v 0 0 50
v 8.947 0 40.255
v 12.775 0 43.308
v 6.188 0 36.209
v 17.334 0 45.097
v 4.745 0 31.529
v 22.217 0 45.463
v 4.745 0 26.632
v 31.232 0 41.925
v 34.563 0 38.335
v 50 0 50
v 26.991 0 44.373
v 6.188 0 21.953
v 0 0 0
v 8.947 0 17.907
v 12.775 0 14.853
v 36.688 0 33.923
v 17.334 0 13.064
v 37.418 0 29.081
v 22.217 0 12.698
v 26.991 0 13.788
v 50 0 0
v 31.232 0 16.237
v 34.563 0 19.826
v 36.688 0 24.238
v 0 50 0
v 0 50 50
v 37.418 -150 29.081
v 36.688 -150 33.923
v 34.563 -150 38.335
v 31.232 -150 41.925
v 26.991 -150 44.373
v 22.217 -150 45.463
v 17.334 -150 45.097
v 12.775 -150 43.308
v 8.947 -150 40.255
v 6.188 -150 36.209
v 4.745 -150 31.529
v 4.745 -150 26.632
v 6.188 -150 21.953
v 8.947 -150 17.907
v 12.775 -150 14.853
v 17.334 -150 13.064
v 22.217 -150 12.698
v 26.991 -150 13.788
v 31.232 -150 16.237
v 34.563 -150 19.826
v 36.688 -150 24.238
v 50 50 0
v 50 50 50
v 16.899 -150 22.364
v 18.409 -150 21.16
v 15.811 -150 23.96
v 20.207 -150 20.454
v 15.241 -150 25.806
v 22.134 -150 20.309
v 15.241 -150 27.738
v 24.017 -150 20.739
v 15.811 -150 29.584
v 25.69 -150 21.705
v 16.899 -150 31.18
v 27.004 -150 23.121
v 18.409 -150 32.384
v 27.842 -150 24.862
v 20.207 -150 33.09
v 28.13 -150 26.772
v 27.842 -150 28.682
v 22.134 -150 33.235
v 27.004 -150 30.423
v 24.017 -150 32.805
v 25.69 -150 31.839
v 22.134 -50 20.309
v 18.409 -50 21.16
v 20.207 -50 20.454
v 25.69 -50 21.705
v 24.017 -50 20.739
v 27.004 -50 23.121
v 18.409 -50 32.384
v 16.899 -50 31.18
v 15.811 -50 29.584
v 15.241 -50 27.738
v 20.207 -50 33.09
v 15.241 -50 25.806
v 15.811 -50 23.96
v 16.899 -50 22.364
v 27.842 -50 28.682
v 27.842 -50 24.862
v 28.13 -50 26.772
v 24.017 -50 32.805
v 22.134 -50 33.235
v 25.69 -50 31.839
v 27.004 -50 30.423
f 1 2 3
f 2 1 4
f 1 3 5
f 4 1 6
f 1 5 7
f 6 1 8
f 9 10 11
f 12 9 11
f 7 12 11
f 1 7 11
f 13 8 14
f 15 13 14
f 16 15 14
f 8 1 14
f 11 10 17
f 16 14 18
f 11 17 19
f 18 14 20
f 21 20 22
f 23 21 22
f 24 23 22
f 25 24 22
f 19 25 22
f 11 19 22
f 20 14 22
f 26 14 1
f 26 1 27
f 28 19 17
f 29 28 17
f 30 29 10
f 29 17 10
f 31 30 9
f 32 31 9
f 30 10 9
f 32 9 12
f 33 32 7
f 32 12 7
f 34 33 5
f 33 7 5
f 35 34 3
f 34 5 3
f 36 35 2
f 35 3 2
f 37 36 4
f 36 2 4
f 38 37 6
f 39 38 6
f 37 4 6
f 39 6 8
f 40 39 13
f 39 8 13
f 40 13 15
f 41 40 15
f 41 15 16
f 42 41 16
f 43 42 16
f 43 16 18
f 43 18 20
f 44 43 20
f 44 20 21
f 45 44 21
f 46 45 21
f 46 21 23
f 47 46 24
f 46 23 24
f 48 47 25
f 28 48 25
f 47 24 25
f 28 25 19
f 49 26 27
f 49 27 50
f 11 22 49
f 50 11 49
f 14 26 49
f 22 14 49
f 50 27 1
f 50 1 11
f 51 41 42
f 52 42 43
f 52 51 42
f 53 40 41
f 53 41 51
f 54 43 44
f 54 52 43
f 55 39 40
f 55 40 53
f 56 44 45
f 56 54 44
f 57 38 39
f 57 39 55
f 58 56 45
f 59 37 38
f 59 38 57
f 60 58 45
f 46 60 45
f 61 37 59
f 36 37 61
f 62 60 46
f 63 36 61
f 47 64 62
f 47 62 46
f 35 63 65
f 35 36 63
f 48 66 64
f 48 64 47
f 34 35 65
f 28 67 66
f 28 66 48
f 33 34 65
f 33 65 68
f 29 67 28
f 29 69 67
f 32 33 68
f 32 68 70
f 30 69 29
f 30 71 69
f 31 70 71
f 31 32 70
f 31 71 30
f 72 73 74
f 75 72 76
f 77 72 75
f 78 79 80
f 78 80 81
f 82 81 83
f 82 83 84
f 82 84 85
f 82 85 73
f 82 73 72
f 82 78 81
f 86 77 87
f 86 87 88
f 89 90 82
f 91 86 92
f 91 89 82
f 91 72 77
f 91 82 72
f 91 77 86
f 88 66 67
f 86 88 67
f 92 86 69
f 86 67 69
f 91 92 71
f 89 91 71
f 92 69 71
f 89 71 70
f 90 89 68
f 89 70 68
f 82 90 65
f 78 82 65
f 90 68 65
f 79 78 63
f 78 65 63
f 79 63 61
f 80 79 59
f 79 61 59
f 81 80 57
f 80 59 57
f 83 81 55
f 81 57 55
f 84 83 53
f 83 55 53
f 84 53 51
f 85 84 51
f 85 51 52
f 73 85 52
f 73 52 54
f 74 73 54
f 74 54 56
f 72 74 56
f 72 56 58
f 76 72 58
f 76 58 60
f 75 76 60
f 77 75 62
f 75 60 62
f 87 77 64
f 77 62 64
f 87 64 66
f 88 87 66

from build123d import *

# Parameters (mm, degrees)
F0_W     = 50
F0_H     = 50
F1_DEPTH = 50
F3_R     = 16.4282141223
F4_DEPTH = 150
F5_R     = 6.4806520978
F6_DEPTH = 100


with BuildPart() as f1:
    # F0 (on Top) → F1 (new body)
    with BuildSketch(Plane.XY):
        with Locations((25, 25)):
            Rectangle(F0_W, F0_H)
    extrude(amount=F1_DEPTH)

    # F3 (on face) → F4 (join)
    with BuildSketch(Plane.XZ):
        with Locations((20.9893193096, 29.0806218982)):
            Circle(F3_R)
    extrude(amount=F4_DEPTH)

    # F5 (on face) → F6 (cut)
    with BuildSketch(Plane.XZ.offset(150)):
        with Locations((21.6495357454, 26.772018522)):
            Circle(F5_R)
    extrude(amount=-F6_DEPTH, mode=Mode.SUBTRACT)


solid = f1.part
